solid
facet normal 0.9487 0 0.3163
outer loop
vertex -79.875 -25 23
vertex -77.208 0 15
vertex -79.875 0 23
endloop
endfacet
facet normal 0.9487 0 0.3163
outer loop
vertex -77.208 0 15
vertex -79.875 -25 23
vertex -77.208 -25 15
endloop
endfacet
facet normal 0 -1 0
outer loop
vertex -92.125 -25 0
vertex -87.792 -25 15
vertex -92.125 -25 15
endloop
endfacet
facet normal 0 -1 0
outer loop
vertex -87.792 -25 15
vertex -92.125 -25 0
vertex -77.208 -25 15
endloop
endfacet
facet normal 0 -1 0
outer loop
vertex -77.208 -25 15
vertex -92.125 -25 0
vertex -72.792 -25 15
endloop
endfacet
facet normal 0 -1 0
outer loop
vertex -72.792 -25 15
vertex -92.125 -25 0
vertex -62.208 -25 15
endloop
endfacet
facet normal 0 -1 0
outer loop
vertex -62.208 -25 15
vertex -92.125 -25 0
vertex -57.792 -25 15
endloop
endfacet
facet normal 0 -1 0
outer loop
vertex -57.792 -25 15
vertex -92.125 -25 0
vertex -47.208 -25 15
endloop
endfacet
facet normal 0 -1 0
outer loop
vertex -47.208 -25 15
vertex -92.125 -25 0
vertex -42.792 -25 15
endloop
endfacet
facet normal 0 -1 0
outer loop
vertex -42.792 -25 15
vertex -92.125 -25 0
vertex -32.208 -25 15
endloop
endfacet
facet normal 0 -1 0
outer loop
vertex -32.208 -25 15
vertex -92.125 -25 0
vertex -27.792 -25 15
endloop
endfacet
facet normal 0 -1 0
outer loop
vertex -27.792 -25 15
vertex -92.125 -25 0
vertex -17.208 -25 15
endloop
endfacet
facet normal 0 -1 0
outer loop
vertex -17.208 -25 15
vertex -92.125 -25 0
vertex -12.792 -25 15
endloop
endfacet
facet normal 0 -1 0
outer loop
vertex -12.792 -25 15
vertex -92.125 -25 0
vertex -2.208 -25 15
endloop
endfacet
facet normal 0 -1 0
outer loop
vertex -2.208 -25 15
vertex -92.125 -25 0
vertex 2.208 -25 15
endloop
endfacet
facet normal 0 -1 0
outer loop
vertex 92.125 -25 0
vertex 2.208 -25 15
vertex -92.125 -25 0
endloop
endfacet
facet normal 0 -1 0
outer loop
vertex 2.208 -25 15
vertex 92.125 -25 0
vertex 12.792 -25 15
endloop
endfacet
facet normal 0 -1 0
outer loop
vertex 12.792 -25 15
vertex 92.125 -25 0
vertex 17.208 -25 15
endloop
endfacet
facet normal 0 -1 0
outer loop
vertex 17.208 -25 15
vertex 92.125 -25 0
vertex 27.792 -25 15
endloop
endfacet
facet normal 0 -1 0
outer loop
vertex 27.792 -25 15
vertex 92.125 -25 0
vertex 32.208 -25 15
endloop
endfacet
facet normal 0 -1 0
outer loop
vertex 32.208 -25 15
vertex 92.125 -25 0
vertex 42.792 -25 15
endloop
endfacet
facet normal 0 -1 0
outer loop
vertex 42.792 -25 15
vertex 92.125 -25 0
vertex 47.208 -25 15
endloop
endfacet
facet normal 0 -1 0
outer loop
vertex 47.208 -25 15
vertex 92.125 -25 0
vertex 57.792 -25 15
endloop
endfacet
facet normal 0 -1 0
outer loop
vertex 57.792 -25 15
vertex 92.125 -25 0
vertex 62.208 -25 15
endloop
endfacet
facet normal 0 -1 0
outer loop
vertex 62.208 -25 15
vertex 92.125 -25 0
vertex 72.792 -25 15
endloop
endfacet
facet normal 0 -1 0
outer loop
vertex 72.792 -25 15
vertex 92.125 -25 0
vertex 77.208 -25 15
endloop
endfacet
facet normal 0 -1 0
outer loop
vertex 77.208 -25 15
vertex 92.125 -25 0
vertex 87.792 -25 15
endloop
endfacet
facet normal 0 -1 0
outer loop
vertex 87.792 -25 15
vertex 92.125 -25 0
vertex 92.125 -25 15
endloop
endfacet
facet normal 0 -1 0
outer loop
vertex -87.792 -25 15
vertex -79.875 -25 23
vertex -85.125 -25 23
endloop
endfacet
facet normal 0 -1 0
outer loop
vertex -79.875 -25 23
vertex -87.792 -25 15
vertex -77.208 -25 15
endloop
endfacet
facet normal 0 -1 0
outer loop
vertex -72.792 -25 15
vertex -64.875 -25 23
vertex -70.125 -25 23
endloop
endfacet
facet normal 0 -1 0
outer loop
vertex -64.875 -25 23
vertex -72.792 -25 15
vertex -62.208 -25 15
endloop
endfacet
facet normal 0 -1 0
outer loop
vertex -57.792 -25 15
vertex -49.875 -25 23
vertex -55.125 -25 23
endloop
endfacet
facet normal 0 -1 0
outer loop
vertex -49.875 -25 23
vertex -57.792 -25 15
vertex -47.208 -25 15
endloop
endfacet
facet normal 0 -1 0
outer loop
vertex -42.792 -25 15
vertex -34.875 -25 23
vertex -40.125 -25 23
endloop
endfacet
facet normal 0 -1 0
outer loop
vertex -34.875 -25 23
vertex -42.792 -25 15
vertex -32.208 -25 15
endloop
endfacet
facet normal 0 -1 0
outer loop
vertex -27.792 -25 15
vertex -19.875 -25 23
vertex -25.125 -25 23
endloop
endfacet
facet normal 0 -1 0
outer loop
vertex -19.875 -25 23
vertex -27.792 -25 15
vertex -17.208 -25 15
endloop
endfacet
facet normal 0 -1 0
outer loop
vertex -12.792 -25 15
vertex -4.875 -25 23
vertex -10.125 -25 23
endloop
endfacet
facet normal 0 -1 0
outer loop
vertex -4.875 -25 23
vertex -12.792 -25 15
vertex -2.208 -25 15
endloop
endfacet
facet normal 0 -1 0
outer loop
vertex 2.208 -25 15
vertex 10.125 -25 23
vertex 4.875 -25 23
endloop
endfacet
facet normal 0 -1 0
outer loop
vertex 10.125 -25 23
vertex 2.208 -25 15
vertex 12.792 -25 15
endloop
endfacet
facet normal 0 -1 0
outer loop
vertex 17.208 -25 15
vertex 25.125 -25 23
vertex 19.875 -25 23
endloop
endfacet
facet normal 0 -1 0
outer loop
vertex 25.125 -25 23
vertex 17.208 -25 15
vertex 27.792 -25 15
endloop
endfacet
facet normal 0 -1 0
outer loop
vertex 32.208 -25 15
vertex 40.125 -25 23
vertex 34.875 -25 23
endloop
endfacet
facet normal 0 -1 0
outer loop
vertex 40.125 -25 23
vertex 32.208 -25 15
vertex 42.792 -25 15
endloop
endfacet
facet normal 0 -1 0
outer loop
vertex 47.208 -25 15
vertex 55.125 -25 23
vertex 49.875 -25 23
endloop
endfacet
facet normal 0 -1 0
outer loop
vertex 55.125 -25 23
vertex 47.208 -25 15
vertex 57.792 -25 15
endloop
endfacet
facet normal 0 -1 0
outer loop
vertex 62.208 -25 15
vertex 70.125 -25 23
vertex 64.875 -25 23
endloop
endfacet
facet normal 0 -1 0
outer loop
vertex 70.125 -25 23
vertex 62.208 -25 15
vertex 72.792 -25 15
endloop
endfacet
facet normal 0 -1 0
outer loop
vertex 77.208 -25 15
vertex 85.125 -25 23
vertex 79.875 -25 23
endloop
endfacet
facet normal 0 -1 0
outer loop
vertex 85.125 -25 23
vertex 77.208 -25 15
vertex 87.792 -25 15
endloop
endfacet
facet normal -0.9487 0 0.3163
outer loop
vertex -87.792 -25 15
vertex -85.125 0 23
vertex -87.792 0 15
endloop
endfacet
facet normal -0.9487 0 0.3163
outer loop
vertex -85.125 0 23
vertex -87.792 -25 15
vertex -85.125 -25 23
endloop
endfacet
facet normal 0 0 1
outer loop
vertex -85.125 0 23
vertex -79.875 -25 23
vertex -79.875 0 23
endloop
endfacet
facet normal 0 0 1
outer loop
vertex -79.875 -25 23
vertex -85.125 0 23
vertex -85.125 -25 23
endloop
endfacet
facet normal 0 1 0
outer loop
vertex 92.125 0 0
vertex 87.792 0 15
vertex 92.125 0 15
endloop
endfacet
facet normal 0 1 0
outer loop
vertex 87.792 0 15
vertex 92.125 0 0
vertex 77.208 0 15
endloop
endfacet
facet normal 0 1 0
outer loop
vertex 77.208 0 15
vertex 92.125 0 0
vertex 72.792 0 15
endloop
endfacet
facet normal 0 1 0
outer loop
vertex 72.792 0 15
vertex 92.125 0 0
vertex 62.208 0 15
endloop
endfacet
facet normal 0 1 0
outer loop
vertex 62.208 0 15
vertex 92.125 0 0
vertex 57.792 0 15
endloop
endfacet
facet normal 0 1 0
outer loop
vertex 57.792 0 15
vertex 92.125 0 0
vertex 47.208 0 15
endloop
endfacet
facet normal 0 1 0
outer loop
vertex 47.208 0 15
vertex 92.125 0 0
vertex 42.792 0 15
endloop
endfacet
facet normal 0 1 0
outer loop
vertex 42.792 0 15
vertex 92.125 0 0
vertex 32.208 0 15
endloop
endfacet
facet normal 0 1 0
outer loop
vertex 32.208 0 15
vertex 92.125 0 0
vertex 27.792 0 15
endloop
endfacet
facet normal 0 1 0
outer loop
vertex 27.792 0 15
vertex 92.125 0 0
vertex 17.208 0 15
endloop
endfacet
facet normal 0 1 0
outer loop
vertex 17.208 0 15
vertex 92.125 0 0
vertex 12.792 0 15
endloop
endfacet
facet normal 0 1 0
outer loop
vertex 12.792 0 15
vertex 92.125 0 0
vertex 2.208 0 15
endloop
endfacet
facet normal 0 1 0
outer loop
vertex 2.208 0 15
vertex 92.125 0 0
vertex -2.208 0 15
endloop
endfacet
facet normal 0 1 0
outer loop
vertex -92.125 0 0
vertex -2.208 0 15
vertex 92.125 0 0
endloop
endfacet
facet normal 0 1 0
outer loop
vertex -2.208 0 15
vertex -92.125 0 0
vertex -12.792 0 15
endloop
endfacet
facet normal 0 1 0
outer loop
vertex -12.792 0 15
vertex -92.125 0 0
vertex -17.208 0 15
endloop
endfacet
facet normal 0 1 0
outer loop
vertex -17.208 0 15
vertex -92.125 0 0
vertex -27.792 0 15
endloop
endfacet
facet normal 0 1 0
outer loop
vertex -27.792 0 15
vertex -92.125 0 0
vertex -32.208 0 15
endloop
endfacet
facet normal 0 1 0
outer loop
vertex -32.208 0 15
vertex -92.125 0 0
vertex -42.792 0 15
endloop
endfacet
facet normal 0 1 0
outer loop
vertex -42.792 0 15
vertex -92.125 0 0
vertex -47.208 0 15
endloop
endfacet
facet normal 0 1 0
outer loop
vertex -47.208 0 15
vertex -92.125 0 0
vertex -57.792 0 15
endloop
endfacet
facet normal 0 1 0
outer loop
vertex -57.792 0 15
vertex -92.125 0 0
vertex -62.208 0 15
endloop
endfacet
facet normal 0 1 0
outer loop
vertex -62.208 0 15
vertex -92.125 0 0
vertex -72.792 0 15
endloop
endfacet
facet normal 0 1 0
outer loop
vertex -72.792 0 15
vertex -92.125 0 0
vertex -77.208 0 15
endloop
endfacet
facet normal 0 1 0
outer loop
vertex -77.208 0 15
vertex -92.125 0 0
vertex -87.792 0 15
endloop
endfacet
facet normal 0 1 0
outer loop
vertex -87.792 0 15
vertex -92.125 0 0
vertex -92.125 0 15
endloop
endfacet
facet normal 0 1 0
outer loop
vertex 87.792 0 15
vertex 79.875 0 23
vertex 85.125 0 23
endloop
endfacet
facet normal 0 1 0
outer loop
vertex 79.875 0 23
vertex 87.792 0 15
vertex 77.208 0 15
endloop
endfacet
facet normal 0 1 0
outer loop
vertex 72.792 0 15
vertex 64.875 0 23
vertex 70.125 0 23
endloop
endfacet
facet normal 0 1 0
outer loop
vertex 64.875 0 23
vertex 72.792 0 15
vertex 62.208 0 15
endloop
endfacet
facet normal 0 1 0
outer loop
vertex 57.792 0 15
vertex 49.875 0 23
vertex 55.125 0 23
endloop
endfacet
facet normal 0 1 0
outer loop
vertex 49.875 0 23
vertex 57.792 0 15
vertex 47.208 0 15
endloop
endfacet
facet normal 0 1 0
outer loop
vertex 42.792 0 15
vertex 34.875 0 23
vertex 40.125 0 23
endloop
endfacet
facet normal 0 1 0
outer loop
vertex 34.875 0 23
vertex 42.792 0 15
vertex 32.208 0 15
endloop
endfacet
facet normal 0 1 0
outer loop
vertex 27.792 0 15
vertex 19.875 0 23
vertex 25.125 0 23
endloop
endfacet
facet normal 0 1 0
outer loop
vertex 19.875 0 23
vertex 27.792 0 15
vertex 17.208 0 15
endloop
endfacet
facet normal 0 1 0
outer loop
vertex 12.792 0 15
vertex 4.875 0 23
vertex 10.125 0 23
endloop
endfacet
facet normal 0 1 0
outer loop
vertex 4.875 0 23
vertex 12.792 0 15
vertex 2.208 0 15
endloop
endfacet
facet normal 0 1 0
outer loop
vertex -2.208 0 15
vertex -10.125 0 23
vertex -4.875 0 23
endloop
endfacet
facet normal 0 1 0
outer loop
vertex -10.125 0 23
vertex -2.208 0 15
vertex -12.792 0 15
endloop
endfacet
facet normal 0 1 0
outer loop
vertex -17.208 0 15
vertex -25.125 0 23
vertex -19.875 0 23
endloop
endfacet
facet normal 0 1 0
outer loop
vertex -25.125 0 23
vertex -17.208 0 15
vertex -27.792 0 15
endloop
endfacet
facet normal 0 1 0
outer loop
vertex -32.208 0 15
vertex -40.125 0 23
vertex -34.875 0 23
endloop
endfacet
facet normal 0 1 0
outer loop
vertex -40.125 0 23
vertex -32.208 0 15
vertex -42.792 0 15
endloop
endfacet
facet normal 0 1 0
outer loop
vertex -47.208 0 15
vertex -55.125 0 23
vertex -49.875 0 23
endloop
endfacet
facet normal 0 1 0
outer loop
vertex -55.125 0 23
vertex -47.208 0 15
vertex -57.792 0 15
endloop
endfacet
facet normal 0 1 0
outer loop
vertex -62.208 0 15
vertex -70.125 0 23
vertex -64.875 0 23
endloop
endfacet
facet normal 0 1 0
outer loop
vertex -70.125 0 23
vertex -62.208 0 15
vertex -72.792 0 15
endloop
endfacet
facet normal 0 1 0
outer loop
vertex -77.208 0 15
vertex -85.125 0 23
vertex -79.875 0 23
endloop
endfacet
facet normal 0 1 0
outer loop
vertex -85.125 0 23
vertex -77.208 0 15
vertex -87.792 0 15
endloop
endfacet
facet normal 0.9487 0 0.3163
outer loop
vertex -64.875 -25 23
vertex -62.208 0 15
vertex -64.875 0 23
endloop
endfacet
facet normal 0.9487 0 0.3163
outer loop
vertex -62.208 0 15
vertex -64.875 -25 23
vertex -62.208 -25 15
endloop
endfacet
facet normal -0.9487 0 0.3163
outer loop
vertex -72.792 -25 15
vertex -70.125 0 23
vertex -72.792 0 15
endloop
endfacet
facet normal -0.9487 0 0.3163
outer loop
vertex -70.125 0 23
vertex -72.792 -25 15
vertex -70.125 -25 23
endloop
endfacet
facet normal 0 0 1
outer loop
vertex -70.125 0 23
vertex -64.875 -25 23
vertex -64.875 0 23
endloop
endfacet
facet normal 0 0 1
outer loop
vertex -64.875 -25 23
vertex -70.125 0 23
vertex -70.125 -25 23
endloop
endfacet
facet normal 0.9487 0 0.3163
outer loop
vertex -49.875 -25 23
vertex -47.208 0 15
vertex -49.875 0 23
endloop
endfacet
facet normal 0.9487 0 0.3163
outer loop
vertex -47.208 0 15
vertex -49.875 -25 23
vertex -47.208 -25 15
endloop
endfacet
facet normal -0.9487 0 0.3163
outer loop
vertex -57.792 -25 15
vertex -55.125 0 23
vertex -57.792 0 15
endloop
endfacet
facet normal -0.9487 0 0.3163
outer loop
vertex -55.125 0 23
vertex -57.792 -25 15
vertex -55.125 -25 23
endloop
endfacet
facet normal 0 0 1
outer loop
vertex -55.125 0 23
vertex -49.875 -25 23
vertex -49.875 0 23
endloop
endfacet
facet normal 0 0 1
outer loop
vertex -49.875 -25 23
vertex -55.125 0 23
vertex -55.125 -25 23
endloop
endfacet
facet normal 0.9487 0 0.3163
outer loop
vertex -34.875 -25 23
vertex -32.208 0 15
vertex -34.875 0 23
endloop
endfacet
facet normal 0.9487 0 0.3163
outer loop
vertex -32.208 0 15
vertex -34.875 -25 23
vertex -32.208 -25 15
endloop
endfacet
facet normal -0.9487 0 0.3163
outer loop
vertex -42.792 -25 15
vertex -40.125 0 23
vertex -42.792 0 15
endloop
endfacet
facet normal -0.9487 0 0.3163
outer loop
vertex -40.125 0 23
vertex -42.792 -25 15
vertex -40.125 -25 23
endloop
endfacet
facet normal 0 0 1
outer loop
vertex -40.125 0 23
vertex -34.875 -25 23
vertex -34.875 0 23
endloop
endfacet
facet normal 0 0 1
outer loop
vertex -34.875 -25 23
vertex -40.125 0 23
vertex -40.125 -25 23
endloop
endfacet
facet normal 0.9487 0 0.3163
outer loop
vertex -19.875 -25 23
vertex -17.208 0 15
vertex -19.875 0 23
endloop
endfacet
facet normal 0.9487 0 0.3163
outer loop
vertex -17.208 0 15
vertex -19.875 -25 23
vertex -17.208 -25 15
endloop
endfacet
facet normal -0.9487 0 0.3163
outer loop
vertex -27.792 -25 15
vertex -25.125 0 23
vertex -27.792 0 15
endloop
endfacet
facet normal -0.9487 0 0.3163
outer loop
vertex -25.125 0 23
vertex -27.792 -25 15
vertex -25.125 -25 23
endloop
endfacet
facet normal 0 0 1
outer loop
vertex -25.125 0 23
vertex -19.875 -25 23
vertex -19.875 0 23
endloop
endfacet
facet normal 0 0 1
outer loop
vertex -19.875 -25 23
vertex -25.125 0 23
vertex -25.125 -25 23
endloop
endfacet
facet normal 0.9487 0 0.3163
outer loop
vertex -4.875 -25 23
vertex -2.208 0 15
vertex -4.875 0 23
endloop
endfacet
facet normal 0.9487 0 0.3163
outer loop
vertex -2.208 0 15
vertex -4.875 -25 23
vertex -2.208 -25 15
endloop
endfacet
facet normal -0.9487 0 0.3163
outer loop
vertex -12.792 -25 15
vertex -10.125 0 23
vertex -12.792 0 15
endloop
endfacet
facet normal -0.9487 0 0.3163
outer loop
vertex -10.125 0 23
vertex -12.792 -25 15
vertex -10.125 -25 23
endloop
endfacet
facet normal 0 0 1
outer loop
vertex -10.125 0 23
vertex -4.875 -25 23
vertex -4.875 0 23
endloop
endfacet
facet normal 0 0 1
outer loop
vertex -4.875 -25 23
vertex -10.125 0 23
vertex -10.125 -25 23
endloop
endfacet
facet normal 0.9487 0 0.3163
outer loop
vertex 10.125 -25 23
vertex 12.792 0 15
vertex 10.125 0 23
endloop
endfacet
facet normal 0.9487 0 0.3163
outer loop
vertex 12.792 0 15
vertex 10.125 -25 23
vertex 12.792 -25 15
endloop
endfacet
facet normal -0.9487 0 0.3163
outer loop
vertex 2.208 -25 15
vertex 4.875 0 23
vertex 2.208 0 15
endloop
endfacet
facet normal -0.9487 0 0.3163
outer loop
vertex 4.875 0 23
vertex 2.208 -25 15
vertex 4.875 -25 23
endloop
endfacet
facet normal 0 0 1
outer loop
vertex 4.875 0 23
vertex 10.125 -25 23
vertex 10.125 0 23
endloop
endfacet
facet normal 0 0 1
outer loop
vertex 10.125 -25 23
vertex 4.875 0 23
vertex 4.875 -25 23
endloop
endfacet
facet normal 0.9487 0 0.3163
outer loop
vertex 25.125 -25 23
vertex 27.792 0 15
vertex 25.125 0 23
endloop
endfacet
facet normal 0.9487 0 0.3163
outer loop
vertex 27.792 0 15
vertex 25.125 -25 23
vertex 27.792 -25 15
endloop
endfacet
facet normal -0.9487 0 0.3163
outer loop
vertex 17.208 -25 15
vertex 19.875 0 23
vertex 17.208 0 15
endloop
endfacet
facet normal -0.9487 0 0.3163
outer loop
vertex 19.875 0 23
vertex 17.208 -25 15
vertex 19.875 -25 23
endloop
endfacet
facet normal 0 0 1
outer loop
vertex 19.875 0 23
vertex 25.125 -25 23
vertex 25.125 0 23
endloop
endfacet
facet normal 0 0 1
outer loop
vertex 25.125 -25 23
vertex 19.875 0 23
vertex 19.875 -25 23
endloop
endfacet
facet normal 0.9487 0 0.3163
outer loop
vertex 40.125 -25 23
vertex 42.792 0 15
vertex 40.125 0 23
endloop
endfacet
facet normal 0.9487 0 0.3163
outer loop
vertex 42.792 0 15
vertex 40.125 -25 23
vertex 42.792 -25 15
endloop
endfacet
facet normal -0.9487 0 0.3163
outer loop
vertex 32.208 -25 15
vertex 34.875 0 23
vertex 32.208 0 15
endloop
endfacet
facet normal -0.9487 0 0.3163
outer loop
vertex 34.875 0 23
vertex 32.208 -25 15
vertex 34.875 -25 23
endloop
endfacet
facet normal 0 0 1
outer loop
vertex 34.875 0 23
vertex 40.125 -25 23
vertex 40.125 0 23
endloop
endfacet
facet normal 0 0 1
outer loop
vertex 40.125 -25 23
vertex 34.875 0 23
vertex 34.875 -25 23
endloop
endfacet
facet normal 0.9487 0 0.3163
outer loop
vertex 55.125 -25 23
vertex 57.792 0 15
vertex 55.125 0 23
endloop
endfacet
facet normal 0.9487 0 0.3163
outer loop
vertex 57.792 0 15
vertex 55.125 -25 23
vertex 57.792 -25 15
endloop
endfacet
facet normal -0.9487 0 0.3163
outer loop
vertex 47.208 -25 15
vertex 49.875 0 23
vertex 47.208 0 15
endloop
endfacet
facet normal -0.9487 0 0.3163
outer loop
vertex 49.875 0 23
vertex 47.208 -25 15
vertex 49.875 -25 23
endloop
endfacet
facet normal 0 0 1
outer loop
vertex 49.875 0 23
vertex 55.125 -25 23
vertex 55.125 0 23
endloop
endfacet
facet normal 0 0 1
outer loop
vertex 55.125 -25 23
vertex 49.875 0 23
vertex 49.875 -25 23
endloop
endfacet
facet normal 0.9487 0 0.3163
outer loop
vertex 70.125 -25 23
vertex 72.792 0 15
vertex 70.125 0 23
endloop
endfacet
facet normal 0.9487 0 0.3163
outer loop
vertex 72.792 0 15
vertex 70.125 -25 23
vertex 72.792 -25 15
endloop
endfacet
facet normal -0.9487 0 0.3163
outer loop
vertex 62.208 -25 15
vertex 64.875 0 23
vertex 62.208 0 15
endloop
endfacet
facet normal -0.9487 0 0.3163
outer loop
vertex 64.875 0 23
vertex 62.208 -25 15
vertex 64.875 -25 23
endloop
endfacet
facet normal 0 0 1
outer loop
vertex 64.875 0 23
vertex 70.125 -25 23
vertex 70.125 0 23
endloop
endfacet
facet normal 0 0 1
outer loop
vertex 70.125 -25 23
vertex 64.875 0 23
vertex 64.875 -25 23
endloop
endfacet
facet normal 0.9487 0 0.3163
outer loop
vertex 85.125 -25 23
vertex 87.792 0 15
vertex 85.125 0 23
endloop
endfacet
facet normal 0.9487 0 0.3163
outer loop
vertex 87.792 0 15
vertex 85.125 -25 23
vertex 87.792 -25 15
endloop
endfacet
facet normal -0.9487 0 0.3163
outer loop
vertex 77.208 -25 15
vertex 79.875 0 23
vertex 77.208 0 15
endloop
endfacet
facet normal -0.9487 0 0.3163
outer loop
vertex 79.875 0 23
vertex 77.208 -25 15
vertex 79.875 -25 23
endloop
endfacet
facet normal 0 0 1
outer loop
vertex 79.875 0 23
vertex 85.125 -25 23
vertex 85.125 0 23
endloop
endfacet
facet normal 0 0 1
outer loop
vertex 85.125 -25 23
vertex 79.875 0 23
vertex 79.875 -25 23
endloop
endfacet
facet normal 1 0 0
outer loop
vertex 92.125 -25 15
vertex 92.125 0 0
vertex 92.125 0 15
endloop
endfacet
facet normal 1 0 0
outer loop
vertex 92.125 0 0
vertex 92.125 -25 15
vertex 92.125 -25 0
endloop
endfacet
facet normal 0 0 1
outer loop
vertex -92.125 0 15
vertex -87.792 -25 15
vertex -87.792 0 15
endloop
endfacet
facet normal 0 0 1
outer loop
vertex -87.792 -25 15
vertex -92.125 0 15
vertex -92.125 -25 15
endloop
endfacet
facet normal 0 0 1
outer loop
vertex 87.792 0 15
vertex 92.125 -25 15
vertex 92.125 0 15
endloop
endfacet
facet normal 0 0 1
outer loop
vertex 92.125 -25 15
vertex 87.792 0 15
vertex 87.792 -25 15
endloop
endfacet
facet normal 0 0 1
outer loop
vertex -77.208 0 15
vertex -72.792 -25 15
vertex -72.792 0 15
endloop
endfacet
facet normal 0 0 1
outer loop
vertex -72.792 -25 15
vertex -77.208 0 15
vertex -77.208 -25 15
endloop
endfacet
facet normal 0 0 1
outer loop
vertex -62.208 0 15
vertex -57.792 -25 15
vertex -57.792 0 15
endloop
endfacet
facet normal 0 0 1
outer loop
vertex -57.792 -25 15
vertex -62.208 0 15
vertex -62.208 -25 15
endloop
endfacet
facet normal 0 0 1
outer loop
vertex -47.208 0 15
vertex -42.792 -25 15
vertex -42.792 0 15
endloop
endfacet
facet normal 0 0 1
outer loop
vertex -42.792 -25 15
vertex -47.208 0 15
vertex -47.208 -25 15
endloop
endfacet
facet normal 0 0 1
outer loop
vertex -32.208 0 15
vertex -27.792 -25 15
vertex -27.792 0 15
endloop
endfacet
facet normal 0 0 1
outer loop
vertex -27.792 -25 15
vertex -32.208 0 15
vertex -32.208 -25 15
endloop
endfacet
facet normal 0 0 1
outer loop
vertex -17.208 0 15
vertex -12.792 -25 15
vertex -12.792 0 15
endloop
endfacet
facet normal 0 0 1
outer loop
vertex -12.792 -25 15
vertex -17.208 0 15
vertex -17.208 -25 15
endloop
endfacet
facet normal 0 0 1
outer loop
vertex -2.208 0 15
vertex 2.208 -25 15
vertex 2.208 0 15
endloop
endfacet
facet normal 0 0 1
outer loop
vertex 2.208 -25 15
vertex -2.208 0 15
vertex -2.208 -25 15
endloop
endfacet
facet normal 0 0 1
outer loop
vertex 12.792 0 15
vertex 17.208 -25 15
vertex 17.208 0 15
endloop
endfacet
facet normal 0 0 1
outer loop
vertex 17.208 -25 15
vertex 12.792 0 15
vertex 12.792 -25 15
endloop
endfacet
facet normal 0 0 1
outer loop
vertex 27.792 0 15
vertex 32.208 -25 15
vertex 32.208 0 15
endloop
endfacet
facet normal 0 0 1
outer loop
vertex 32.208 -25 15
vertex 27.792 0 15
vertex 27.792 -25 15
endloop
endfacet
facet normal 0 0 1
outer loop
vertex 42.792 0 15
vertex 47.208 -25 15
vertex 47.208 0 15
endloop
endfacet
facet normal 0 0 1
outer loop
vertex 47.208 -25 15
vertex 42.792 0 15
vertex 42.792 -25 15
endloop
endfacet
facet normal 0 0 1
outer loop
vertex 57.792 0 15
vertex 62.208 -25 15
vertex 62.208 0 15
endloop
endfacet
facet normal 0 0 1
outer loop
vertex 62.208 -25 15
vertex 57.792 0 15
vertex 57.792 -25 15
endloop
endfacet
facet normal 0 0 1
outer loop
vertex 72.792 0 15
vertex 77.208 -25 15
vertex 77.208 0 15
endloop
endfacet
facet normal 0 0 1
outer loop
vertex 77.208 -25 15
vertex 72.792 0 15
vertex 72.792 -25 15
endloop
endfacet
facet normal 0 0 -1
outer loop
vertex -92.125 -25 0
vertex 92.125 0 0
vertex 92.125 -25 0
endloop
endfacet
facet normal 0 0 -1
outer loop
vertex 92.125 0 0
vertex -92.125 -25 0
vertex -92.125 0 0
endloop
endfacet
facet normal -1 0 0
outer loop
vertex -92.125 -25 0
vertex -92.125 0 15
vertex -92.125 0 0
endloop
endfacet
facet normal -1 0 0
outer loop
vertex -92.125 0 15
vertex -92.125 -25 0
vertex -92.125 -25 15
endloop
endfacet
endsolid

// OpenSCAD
$fn = 32;

// ----------------------------------------------------------------------
// Toothed rack, 12 teeth
// 15 mm pitch, 8 mm teeth
// ----------------------------------------------------------------------

// --- parameters (mm) ---
bar_w = 25;      // bar width (Y)
bar_h = 15;      // bar height (Z)
teeth = 12;      // number of teeth
pitch = 15;      // tooth pitch
tooth_h = 8;     // tooth height above the bar
root_w = 11.25;  // tooth width at the root
crest_w = 5.25;  // tooth width at the crest

// --- derived feature positions (mm) ---
span = (teeth - 1) * pitch;  // = 165   distance between the outer teeth
bar_l = span + root_w + 8;   // = 184.25   bar length: teeth plus 4 mm at each end
tooth_x = -span / 2;         // = -82.5   X of the first tooth
height = bar_h + tooth_h;    // = 23   overall height
feature_centers = [
  [tooth_x + 0 * pitch, -bar_w / 2],
  [tooth_x + 1 * pitch, -bar_w / 2],
  [tooth_x + 2 * pitch, -bar_w / 2],
  [tooth_x + 3 * pitch, -bar_w / 2],
  [tooth_x + 4 * pitch, -bar_w / 2],
  [tooth_x + 5 * pitch, -bar_w / 2],
  [tooth_x + 6 * pitch, -bar_w / 2],
  [tooth_x + 7 * pitch, -bar_w / 2],
  [tooth_x + 8 * pitch, -bar_w / 2],
  [tooth_x + 9 * pitch, -bar_w / 2],
  [tooth_x + 10 * pitch, -bar_w / 2],
  [tooth_x + 11 * pitch, -bar_w / 2]
];   // tooth centre line, drives the tooth loop

// bar with a rack of teeth, one extruded trapezoium per centre
module rack_tooth() {
  linear_extrude(height = bar_w)
    polygon(points = [
      [0, 0],
      [root_w, 0],
      [root_w / 2 + crest_w / 2, tooth_h + 1],
      [root_w / 2 - crest_w / 2, tooth_h + 1]
    ]);
}

union() {
  translate([-bar_l / 2, -bar_w, 0]) cube([bar_l, bar_w, bar_h]);
  for (centre = feature_centers)
    translate([centre[0] - root_w / 2, 0, bar_h - 1]) rotate([90, 0, 0]) rack_tooth();
}
